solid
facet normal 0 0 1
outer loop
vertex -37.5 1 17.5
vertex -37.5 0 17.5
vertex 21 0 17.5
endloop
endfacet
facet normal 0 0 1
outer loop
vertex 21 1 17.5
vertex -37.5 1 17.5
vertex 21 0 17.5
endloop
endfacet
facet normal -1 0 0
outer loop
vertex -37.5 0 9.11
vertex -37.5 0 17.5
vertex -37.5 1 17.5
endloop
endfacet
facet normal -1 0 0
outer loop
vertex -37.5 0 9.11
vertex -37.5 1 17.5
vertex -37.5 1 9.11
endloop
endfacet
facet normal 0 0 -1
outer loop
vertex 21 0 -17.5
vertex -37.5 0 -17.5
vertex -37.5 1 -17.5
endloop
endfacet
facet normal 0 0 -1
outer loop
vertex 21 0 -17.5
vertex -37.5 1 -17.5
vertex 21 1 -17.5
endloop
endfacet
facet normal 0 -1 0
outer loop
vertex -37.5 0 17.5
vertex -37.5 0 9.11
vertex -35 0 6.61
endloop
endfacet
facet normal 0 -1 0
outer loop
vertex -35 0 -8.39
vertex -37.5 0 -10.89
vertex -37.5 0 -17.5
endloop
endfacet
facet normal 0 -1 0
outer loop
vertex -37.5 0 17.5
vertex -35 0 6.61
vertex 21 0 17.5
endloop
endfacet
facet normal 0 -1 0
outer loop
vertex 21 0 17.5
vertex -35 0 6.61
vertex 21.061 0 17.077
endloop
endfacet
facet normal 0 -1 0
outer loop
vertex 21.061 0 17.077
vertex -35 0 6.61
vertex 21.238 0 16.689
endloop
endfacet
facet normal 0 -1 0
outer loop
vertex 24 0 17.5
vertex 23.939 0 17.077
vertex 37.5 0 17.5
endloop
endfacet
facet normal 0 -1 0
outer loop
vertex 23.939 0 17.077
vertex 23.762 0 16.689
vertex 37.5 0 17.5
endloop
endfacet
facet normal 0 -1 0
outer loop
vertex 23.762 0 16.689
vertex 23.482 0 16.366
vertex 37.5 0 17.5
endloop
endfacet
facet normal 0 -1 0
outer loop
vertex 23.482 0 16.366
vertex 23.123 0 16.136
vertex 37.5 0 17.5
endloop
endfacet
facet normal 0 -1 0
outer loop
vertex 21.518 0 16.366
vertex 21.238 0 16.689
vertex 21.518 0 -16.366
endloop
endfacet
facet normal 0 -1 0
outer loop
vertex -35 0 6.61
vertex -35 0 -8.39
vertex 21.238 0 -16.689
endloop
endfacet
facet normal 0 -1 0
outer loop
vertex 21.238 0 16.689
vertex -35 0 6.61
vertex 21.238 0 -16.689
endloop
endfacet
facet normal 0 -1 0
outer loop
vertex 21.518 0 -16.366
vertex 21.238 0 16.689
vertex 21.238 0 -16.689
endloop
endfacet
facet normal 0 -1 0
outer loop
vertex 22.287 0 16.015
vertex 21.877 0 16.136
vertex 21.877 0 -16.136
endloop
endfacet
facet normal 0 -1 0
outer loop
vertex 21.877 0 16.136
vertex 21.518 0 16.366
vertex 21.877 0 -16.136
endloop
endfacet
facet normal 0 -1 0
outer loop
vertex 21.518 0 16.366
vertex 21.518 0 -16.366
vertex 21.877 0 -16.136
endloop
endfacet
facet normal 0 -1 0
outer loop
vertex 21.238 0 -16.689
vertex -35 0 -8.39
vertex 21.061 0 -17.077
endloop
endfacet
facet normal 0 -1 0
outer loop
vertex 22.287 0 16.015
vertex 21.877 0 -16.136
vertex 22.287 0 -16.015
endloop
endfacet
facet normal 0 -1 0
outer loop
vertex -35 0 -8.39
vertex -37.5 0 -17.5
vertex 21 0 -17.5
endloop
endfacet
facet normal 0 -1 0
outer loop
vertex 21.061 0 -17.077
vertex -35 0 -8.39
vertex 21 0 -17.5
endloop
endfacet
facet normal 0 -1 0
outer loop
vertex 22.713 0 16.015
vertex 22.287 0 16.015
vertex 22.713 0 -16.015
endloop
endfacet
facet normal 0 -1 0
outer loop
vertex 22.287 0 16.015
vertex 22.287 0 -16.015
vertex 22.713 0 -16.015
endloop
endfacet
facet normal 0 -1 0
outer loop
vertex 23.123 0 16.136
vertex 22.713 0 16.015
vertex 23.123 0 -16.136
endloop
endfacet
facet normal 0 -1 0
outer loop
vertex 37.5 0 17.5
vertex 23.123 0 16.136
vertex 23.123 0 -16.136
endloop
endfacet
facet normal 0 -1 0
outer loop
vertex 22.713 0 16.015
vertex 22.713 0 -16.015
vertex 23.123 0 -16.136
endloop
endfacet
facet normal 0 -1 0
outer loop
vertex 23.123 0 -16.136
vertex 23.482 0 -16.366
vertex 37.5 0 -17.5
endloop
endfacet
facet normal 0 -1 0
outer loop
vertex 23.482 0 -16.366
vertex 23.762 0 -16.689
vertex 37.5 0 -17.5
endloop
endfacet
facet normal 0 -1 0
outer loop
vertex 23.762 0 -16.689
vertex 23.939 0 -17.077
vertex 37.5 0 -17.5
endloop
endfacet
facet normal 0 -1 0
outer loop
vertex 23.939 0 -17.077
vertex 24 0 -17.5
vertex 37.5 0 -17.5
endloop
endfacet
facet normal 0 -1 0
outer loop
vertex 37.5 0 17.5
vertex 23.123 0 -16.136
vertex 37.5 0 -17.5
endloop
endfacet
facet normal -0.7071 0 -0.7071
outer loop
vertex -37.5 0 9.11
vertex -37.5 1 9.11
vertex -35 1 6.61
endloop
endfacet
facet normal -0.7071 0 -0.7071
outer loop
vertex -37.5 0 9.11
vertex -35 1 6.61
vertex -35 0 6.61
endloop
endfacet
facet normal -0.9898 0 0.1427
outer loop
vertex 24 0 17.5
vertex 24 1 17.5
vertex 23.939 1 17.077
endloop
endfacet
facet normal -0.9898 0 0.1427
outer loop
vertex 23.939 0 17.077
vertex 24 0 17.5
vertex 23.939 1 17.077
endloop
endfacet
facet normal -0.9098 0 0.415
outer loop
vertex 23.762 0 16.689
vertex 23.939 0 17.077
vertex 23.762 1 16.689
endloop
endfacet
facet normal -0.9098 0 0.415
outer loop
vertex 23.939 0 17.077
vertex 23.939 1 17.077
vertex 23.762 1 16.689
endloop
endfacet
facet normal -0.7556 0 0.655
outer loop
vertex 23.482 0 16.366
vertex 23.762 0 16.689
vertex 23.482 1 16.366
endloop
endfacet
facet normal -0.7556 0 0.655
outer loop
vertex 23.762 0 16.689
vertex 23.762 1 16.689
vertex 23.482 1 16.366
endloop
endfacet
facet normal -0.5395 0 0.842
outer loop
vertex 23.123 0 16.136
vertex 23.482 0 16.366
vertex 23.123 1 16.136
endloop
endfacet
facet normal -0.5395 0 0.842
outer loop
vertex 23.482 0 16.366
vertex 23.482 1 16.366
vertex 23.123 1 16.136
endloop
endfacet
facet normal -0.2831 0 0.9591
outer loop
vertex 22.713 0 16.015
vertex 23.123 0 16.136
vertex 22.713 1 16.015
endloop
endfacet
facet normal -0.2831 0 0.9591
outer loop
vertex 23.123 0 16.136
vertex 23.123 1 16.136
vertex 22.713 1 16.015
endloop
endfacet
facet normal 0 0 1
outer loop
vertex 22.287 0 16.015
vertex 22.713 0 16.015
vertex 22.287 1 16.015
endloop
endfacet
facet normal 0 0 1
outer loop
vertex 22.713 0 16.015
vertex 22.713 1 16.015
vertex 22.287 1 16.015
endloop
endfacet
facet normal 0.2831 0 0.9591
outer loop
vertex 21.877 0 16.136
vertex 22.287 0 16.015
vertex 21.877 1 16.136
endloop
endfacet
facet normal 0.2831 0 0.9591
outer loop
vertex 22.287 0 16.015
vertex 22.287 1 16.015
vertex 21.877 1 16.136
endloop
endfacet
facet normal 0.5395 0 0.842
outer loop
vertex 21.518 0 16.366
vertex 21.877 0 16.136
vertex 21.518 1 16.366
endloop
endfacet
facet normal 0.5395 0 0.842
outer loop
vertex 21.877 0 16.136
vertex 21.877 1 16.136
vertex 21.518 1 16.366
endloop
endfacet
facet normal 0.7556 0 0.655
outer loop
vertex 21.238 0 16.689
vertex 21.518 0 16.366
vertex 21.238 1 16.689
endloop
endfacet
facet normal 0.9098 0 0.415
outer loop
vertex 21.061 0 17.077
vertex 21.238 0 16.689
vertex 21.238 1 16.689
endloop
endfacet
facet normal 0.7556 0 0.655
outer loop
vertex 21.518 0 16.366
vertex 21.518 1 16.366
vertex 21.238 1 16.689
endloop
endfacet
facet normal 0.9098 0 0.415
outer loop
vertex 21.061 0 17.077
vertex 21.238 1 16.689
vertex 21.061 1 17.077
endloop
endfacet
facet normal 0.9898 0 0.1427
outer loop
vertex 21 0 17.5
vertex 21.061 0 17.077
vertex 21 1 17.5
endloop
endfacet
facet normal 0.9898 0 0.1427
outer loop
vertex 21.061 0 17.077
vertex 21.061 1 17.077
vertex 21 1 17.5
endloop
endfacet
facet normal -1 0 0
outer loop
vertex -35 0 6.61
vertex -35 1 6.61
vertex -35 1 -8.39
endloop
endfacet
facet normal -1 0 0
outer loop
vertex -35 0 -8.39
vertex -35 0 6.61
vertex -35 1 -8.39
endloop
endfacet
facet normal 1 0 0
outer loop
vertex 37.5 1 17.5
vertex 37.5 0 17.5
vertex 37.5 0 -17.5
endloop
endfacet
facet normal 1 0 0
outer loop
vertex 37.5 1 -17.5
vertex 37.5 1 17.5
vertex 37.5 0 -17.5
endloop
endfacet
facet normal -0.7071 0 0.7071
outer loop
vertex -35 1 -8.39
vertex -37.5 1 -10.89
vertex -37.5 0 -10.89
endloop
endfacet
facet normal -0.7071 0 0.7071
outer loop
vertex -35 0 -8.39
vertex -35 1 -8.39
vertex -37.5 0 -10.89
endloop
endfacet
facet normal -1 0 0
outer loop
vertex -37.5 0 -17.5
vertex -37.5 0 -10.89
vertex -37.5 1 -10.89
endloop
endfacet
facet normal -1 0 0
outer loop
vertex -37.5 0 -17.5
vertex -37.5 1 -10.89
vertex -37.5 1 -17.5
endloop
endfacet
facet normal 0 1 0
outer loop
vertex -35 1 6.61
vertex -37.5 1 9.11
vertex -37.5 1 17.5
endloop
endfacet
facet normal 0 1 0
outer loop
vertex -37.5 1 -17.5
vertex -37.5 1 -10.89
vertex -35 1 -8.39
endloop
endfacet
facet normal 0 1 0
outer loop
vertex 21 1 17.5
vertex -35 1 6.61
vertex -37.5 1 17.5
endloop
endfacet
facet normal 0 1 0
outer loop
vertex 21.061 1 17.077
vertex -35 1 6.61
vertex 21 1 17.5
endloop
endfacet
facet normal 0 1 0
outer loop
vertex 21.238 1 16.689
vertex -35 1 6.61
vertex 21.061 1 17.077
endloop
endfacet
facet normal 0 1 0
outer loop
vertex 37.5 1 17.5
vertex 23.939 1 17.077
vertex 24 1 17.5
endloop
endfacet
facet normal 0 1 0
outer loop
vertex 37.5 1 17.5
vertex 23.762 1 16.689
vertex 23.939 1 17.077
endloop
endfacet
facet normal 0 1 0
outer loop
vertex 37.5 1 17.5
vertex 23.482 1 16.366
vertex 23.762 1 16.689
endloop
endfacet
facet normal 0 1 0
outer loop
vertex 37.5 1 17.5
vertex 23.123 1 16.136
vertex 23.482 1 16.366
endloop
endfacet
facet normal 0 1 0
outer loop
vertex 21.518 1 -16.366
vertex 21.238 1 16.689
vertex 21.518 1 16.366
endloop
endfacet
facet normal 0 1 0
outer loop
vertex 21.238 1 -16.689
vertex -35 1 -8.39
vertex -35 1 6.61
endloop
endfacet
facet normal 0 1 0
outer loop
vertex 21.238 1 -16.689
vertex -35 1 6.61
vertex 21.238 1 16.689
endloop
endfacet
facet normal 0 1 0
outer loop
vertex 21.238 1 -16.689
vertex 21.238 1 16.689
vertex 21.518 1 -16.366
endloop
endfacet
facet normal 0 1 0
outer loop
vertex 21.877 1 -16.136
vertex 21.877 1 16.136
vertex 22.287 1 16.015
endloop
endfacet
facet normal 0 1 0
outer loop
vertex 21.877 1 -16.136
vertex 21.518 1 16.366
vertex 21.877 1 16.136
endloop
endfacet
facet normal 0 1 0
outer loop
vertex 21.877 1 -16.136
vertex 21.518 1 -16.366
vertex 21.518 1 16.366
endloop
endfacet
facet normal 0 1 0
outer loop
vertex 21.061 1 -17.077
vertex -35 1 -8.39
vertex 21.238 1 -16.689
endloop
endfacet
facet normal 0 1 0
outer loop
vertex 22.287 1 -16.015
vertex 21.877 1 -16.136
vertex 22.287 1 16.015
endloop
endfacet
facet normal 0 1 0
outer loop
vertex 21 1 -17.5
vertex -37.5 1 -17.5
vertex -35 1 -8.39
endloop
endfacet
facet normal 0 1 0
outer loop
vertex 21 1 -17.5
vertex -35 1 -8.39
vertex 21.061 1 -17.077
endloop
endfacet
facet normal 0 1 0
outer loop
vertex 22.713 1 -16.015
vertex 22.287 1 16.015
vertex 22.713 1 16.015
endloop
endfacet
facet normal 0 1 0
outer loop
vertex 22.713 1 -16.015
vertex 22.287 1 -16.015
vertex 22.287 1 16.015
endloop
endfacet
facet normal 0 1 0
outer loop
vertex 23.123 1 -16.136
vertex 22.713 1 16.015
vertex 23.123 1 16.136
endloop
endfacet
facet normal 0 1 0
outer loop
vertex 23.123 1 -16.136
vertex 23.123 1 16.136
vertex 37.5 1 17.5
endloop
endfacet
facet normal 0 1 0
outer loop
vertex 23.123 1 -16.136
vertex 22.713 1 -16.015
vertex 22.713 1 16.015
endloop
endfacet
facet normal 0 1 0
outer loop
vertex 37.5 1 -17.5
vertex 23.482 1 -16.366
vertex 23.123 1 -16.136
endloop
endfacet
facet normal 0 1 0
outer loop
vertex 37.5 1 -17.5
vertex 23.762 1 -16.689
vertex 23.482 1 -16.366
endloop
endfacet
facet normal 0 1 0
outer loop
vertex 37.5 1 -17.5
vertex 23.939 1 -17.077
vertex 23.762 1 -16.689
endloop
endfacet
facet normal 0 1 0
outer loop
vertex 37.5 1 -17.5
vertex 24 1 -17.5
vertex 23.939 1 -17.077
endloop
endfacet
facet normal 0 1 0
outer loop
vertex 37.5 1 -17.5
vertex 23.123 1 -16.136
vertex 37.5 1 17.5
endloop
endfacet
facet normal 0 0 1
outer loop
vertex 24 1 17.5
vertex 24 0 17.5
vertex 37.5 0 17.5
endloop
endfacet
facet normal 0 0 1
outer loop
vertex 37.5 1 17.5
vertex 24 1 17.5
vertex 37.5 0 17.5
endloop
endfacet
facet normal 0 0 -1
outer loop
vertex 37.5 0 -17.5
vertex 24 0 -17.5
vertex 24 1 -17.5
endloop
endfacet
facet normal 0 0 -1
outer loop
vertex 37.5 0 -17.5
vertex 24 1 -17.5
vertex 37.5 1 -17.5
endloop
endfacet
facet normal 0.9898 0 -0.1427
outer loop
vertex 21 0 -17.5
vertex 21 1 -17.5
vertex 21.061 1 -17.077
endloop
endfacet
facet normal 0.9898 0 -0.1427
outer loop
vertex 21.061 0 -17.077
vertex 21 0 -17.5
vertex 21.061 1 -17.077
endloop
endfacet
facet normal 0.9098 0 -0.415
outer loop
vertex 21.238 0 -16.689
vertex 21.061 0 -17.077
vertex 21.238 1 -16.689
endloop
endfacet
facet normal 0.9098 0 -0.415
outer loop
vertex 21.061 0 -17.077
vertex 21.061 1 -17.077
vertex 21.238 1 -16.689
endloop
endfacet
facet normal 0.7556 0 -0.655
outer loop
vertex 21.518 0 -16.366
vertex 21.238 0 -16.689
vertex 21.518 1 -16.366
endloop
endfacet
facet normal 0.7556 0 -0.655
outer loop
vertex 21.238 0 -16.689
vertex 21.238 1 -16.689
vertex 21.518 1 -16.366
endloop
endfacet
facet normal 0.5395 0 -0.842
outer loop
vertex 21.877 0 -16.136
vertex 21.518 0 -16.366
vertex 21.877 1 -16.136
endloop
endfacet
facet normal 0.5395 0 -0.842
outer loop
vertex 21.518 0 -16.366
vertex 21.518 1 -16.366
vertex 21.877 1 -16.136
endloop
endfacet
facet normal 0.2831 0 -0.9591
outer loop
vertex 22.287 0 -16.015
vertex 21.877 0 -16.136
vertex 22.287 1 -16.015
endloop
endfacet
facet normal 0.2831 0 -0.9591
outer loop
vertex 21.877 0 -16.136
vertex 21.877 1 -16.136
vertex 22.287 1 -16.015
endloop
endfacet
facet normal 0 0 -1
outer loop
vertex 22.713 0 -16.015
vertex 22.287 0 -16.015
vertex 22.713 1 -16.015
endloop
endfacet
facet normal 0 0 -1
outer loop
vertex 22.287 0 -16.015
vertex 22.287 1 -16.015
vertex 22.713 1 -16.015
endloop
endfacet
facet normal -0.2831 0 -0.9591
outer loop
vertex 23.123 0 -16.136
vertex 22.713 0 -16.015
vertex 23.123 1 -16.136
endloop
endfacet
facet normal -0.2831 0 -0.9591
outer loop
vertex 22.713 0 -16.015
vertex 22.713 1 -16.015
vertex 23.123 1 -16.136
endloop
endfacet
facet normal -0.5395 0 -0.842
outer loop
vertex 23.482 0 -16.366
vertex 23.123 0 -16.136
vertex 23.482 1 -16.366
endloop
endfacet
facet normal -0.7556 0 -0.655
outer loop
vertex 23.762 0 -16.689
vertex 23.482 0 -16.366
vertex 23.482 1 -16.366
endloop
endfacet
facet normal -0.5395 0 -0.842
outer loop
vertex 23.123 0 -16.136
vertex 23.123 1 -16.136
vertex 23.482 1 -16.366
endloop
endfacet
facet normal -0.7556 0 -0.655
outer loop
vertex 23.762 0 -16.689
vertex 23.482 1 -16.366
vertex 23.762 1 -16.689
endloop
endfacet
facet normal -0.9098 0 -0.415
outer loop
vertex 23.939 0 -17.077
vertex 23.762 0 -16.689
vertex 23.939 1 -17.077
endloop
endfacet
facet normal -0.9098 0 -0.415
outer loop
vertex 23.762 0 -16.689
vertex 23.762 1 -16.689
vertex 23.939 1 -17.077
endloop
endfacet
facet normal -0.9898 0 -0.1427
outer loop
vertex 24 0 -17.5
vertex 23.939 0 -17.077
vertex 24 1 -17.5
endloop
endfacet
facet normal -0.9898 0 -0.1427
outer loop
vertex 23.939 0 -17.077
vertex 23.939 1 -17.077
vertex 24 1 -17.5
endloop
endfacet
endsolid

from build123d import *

# Parameters (mm, degrees)
SKETCH1_W           = 75
SKETCH1_H           = 35
BOSS_EXTRUDE1_DEPTH = 1
SKETCH2_R           = 1.5
SKETCH2_W           = 5
SKETCH2_H           = 20
CUT_EXTRUDE1_DEPTH  = 10
CHAMFER1_SIZE       = 2.5


with BuildPart() as part:
    # Sketch1 → Boss-Extrude1 (new body)
    with BuildSketch(Plane(origin=(0, 0, 0), x_dir=(1, 0, 0), z_dir=(0, 1, 0))):
        Rectangle(SKETCH1_W, SKETCH1_H)
    extrude(amount=BOSS_EXTRUDE1_DEPTH)

    # Sketch2 → Cut-Extrude1 (cut)
    with BuildSketch(Plane(origin=(0, 1, 0), x_dir=(1, 0, 0), z_dir=(0, 1, 0))):
        with Locations((22.5, 17.5)):
            Circle(SKETCH2_R)
        with Locations((22.5, -17.5)):
            Circle(SKETCH2_R)
        with Locations((-37.5, 0.89)):
            Rectangle(SKETCH2_W, SKETCH2_H)
    extrude(amount=-CUT_EXTRUDE1_DEPTH, mode=Mode.SUBTRACT)

    # Chamfer1
    chamfer1_edges = [part.edges().sort_by_distance(p)[0] for p in [
        (-35, 0.5, 9.11),
        (-35, 0.5, -10.89),
    ]]
    chamfer(chamfer1_edges, length=CHAMFER1_SIZE - 0.0001)  # a hair under: the kernel refuses the full size


solid = part.part
